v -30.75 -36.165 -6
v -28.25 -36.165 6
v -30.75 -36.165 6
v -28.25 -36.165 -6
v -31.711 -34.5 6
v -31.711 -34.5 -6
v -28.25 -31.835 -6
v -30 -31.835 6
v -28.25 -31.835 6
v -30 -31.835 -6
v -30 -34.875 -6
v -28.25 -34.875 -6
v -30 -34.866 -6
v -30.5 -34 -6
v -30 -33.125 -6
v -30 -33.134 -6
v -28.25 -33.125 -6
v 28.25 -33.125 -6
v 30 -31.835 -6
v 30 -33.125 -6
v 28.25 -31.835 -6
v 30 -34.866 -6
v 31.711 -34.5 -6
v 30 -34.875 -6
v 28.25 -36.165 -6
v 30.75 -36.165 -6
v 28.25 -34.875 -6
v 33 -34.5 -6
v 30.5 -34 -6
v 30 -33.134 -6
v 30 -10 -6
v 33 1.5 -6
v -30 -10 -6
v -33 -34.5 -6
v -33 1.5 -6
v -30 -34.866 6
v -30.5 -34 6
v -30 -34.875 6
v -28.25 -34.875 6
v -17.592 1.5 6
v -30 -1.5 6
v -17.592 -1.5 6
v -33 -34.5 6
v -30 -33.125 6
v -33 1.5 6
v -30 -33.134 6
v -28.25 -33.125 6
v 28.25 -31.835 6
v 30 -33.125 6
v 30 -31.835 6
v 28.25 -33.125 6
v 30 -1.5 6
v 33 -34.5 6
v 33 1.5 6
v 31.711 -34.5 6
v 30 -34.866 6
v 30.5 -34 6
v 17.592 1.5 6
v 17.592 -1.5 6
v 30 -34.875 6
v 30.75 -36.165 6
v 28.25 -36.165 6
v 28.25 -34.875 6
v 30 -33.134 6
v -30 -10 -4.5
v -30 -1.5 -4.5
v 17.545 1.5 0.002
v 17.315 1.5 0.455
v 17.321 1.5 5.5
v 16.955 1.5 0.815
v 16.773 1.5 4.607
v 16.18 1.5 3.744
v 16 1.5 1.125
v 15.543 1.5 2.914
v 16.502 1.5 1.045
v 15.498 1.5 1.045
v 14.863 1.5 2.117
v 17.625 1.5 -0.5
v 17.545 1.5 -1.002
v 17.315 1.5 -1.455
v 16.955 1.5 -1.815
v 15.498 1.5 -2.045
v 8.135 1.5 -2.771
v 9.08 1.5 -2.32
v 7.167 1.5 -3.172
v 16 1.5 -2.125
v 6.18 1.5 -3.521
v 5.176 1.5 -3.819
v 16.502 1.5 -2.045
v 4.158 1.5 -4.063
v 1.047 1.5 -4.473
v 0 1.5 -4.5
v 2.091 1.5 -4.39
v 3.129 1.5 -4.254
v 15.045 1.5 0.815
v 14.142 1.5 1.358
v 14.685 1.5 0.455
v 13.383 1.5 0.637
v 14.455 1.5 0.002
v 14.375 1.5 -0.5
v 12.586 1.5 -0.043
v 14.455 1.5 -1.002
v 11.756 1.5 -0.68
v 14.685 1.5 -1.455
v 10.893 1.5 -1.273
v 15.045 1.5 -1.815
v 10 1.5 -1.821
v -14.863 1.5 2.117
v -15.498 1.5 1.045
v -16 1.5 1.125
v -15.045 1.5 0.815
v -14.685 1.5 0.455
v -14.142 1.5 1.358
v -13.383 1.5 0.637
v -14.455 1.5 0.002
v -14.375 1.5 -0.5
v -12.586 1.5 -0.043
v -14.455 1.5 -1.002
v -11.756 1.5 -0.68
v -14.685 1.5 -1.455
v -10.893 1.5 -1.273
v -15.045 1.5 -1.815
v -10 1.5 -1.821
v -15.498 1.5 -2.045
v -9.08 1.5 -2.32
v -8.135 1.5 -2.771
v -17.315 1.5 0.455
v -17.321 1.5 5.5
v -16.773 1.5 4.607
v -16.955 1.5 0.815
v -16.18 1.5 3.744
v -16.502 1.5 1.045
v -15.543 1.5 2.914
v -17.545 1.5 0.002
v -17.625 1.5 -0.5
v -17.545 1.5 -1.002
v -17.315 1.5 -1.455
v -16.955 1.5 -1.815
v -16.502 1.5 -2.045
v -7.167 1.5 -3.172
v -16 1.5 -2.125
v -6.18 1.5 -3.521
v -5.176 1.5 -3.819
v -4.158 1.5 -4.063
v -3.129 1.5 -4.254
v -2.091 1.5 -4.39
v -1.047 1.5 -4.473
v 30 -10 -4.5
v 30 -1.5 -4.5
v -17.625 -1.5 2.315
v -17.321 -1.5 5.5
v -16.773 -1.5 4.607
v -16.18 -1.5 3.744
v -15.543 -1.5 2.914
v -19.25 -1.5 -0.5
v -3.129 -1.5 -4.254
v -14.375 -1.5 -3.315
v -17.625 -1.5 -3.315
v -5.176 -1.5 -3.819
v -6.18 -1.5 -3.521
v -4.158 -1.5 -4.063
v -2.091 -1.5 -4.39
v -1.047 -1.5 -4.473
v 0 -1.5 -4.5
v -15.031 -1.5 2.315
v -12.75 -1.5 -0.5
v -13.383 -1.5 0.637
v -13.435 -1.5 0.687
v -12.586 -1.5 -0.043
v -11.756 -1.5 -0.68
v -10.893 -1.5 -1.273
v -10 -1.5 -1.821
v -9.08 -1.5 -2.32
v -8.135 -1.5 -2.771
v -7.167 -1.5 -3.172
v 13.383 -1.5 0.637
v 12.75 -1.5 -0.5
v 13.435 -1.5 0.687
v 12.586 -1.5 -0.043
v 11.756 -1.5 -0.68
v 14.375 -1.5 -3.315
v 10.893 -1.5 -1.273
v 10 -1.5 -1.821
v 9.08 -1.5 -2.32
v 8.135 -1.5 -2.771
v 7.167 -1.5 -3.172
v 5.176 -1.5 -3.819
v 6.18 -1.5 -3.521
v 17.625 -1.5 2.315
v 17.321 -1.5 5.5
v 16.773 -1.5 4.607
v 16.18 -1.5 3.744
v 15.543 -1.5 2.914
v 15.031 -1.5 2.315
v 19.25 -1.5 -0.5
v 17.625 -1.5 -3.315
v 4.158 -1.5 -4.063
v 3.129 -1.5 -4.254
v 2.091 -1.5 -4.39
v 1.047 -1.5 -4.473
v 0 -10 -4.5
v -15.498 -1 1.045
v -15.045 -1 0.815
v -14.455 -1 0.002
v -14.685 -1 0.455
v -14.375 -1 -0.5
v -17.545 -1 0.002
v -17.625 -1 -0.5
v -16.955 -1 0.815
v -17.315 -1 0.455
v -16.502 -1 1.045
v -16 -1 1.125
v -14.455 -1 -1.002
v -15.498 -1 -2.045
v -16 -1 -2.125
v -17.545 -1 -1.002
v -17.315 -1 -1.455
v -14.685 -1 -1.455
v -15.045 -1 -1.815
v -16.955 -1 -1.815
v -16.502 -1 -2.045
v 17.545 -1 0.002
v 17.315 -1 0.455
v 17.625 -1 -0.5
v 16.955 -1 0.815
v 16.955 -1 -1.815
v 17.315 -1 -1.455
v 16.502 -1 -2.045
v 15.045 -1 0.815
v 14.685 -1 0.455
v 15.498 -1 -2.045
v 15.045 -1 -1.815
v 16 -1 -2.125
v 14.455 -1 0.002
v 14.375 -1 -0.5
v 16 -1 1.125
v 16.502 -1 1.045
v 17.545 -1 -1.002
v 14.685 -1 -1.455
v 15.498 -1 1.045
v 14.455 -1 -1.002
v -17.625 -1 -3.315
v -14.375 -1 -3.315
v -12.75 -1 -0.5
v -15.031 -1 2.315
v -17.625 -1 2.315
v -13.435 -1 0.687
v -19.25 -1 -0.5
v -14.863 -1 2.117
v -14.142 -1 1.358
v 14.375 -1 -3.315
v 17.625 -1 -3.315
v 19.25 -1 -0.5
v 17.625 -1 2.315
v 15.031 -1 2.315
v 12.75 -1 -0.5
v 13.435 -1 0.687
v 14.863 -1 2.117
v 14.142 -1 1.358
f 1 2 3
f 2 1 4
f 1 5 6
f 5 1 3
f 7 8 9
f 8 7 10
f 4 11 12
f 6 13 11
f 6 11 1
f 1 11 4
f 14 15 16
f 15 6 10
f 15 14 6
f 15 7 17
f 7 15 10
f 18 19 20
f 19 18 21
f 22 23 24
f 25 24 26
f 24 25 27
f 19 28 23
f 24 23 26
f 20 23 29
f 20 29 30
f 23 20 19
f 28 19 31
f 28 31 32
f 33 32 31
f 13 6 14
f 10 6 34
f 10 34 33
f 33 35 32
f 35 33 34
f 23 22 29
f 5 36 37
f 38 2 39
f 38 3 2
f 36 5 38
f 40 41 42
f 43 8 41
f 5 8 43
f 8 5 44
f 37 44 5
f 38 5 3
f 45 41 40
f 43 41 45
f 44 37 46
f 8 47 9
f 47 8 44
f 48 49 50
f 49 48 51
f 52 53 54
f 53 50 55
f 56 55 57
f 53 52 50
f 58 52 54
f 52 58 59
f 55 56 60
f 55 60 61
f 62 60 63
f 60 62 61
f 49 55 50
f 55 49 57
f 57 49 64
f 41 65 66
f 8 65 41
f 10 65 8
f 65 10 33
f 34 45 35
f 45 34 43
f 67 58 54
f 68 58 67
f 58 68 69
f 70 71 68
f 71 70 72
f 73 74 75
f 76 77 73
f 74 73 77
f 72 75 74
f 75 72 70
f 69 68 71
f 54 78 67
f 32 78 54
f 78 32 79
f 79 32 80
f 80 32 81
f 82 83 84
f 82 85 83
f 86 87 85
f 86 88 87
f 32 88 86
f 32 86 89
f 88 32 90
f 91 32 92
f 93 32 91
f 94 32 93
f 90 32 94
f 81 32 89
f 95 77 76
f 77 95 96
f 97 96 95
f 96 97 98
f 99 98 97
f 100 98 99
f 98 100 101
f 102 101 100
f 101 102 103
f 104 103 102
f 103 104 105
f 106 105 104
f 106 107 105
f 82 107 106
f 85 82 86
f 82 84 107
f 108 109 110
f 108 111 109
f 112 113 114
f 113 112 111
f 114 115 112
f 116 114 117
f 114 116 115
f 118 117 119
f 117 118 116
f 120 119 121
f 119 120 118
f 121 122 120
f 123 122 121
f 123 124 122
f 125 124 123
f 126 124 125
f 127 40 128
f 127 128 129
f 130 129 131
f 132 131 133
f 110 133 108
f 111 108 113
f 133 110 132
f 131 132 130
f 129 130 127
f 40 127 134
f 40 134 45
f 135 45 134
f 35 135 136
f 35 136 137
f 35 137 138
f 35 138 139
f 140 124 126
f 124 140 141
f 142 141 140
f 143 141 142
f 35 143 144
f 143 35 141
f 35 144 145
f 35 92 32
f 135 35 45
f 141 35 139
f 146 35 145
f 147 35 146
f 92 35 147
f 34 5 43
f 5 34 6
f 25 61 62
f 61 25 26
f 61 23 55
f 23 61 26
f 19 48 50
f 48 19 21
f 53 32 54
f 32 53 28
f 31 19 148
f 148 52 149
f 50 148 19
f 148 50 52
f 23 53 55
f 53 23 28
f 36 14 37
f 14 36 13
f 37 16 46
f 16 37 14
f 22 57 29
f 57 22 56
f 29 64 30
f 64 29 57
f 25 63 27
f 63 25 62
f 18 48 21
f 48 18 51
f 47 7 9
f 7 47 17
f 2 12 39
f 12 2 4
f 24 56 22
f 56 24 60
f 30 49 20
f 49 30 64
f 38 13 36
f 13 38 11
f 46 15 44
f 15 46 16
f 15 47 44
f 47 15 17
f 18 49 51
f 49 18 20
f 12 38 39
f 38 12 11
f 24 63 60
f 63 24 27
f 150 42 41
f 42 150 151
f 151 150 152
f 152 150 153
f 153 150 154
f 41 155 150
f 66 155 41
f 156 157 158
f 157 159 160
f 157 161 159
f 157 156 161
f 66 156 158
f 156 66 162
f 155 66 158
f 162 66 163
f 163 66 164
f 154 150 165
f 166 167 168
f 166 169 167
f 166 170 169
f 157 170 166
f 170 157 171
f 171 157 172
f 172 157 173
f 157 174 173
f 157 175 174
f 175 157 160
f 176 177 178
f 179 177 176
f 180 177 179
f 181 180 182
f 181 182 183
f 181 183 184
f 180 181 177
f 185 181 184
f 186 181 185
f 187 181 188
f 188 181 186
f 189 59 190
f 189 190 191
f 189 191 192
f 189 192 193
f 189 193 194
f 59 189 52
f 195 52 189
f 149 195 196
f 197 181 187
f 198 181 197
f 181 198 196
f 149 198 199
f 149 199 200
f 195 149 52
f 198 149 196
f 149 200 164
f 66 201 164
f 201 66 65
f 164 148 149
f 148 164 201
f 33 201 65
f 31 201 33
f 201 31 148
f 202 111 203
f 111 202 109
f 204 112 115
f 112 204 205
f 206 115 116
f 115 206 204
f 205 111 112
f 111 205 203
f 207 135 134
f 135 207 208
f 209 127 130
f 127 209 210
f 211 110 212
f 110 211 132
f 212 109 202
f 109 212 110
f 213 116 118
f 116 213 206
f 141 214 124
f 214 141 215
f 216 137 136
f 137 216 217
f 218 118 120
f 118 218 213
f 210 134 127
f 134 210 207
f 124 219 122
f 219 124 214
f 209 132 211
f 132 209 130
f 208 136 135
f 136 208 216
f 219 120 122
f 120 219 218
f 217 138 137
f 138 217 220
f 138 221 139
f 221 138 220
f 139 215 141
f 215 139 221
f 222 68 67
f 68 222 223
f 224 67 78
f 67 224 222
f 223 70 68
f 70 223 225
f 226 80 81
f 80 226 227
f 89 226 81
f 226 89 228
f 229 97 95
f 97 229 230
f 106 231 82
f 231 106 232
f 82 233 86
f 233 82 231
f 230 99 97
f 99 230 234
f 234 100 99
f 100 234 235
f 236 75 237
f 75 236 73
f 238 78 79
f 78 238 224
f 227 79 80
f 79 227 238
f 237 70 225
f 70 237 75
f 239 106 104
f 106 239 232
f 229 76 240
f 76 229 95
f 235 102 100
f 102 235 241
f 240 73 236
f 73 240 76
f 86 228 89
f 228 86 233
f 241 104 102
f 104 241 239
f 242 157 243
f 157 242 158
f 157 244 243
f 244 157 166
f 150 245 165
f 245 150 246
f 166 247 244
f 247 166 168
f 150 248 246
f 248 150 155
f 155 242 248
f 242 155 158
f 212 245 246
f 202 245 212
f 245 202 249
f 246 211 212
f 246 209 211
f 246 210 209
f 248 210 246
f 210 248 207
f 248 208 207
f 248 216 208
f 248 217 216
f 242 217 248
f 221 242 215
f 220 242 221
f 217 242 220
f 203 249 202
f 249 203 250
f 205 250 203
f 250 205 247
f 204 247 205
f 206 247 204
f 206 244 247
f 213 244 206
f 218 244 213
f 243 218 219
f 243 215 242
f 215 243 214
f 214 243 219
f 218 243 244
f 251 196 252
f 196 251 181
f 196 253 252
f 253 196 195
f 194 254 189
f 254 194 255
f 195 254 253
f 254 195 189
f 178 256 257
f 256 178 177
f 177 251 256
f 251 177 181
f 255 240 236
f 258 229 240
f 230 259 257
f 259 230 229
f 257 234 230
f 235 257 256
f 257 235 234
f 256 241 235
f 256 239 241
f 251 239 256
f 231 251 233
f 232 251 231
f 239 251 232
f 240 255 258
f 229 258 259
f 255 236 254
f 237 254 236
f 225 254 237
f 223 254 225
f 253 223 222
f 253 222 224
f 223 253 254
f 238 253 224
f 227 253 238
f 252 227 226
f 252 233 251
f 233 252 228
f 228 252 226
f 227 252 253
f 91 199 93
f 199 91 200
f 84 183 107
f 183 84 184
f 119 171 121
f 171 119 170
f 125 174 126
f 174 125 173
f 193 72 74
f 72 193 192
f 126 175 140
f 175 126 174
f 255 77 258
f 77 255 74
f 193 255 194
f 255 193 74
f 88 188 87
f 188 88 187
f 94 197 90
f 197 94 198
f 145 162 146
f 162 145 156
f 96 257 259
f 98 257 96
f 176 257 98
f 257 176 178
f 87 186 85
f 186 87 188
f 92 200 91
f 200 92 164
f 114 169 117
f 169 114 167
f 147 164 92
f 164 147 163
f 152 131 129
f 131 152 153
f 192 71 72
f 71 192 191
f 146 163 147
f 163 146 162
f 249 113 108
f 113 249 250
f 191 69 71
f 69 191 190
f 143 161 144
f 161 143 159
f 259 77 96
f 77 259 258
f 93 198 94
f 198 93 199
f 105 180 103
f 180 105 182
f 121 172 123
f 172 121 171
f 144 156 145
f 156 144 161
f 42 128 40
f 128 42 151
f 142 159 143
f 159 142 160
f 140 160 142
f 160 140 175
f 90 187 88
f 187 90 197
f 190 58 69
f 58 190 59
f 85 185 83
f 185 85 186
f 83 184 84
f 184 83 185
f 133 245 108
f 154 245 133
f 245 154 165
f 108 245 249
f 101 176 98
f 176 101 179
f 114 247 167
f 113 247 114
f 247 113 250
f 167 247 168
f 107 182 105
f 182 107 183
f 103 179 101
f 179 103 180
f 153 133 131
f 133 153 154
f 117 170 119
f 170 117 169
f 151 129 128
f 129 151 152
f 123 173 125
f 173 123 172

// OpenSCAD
// [FL_INDEX: keywords="openscad, 3d_parametric, MOAB_-_MOther_of_All_fan_Brackets, csg_solid" | COT="Parametric OpenSCAD design from 3DCodeverse"]
// Title: MOAB - MOther of All fan Brackets

// MOAB - MOther of All fan Brackets
// Design by Marius Gheorghescu, October 2013.
// Update log
// November 5th 2013: 
//  - fan cutout (and the screw holes) can be removed entirely now to produce spacers or PCB feet 
//  - hex nuts resize with screw size (need to vealidate in practice)
//  - cross-brace is configurable and can also be removed


// Typical values 40, 50, 60, 80. Set to 0 to not have a fan cutout.
fan_size = 40;

// Distance between two fan holes. Typical values: 32.00 for 40mm fan, 40.00 for 50mm fan, 50.00 for 60mm fan, 71.50 for 80mm fan, 105.00 for 120mm fan. Set to value larger than fan size to not have any screw holes
fan_hole_spacing = 32;

// Use 3.25mm for M3, 4.25mm for M4 and so on
screw_diameter = 3.25;

// width of the PCB. Common values: 60mm for RAMPS, 53.5mm for Arduino, 56mm for Raspberry Pi
pcb_width = 60.0;

// distance from bottom of the fan to PCB. Recommended value for RAMPS fuse clearance: 35mm
bracket_height = 36;

// how long the bracket needs to be, typically 10mm for mini brackets, or close to fan size for full brackets
bracket_length = 12;

// typically 2-4mm
bracket_thickness = 3.0;

// how tall is the cross brace that addds additional strength to the bracket, set to 0 to not have one
cross_bracket = 10;

/* [Hidden] */

// how much to go over the PCB
lip_size = 1.75;

// effective width of the bracket at the top
bracket_width = max(pcb_width, fan_size - 4);

module legs()
{

    difference() {
        union() {

            // left clip
            color([0,0,.5])
            translate([-pcb_width/2 + .5, -bracket_height + 2, 0])
                rotate([0, 0, 180]) 
                    cylinder(r=2.5, h=bracket_length, $fn=6, center=true);

            // left leg
            color([0,0,1])
            translate([-pcb_width/2 - bracket_thickness, -bracket_height + bracket_thickness/2, -bracket_length/2])
                cube([bracket_thickness, bracket_height, bracket_length]);


            // right clip
            color([0,0,.5])
            translate([pcb_width/2 - .5, -bracket_height + 2, 0])
                 rotate([0, 0, 180]) 
                     cylinder(r=2.5, h=bracket_length, $fn=6, center=true);

            // right leg
            color([0,0,1])
           translate([pcb_width/2 , -bracket_height + bracket_thickness/2, -bracket_length/2])
                cube([bracket_thickness, bracket_height, bracket_length]);

        }

        // left cutout
       translate([-pcb_width/2 + .5, -bracket_height + 2, 0])
            rotate([0, 0, 180]) 
                cylinder(r=1, h=bracket_length + 0.1, $fn=6, center=true);

        // right cutout
       translate([pcb_width/2 - .5, -bracket_height + 2, 0])
            cylinder(r=1, h=bracket_length + 0.1, $fn=6, center=true);

        // PCB lips clearance
        translate([0, -bracket_height + bracket_thickness + -.5,0])
            cube([pcb_width - 2*lip_size, 12, bracket_length + 0.1], center=true);

        // PCB
        translate([0, -bracket_height + 2, 0])
            cube([pcb_width, 1.75, bracket_length + 0.1], center=true);

    }

}

module fan_mask()
{
    // M3 screw
    translate([-fan_hole_spacing/2, -fan_hole_spacing/2, 0])
        cylinder(r=screw_diameter/2, h=bracket_height, $fn=20, center=true);
    translate([fan_hole_spacing/2, -fan_hole_spacing/2, 0])
        cylinder(r=screw_diameter/2, h=bracket_height, $fn=20, center=true);
    translate([-fan_hole_spacing/2, fan_hole_spacing/2, 0])
        cylinder(r=screw_diameter/2, h=bracket_height, $fn=20, center=true);
    translate([fan_hole_spacing/2, fan_hole_spacing/2, 0])
        cylinder(r=screw_diameter/2, h=bracket_height, $fn=20, center=true);

    // M3 nuts
    translate([-fan_hole_spacing/2, -fan_hole_spacing/2, 0])
        cylinder(r=screw_diameter, h=4, $fn=6, center=true);
    translate([fan_hole_spacing/2, -fan_hole_spacing/2, 0])
        cylinder(r=screw_diameter, h=4, $fn=6, center=true);
    translate([-fan_hole_spacing/2, fan_hole_spacing/2, 0])
        cylinder(r=screw_diameter, h=4, $fn=6, center=true);
    translate([fan_hole_spacing/2, fan_hole_spacing/2, 0])
        cylinder(r=screw_diameter, h=4, $fn=6, center=true);

    // fan blade clearance
    difference() {
        cylinder(r=fan_size/2, h=bracket_height, $fn=120, center=true);

        // $TODO - add support around the screws if they are too close to the blades
        // also need to add support if the bracket is not wide (tall) enough 
    }
}


module bracket()
{
    difference() {
        union() {

            // fan base
            translate([0, 0, 0])
                cube([bracket_width + 2*bracket_thickness, bracket_thickness, bracket_length], center=true);

            // extra strength 
            color([1,.5,0])
            translate([0, -cross_bracket/2, -bracket_length/2 + bracket_thickness/4])
                cube([pcb_width + 1, cross_bracket, bracket_thickness/2], center=true);

            legs();
        }


        translate([0, -bracket_thickness, -bracket_length/2 + fan_size/2 + bracket_thickness/2])
        rotate([90,0,0])
            fan_mask();

        }
}


module assembly() 
{
    color([1,0,0])
    translate([0, 0, -fan_size/2])
        bracket();

    color([1,0,0])
    //translate([0, 0, fan_size/2])
    rotate([0,180,0])
        bracket();

    color([0,.5,0])
    translate([0, -bracket_height + 2, 0])
        cube([pcb_width - 1, 1.75, fan_size*1.5], center=true);

}

//assembly();
bracket();
//fan_mask();
